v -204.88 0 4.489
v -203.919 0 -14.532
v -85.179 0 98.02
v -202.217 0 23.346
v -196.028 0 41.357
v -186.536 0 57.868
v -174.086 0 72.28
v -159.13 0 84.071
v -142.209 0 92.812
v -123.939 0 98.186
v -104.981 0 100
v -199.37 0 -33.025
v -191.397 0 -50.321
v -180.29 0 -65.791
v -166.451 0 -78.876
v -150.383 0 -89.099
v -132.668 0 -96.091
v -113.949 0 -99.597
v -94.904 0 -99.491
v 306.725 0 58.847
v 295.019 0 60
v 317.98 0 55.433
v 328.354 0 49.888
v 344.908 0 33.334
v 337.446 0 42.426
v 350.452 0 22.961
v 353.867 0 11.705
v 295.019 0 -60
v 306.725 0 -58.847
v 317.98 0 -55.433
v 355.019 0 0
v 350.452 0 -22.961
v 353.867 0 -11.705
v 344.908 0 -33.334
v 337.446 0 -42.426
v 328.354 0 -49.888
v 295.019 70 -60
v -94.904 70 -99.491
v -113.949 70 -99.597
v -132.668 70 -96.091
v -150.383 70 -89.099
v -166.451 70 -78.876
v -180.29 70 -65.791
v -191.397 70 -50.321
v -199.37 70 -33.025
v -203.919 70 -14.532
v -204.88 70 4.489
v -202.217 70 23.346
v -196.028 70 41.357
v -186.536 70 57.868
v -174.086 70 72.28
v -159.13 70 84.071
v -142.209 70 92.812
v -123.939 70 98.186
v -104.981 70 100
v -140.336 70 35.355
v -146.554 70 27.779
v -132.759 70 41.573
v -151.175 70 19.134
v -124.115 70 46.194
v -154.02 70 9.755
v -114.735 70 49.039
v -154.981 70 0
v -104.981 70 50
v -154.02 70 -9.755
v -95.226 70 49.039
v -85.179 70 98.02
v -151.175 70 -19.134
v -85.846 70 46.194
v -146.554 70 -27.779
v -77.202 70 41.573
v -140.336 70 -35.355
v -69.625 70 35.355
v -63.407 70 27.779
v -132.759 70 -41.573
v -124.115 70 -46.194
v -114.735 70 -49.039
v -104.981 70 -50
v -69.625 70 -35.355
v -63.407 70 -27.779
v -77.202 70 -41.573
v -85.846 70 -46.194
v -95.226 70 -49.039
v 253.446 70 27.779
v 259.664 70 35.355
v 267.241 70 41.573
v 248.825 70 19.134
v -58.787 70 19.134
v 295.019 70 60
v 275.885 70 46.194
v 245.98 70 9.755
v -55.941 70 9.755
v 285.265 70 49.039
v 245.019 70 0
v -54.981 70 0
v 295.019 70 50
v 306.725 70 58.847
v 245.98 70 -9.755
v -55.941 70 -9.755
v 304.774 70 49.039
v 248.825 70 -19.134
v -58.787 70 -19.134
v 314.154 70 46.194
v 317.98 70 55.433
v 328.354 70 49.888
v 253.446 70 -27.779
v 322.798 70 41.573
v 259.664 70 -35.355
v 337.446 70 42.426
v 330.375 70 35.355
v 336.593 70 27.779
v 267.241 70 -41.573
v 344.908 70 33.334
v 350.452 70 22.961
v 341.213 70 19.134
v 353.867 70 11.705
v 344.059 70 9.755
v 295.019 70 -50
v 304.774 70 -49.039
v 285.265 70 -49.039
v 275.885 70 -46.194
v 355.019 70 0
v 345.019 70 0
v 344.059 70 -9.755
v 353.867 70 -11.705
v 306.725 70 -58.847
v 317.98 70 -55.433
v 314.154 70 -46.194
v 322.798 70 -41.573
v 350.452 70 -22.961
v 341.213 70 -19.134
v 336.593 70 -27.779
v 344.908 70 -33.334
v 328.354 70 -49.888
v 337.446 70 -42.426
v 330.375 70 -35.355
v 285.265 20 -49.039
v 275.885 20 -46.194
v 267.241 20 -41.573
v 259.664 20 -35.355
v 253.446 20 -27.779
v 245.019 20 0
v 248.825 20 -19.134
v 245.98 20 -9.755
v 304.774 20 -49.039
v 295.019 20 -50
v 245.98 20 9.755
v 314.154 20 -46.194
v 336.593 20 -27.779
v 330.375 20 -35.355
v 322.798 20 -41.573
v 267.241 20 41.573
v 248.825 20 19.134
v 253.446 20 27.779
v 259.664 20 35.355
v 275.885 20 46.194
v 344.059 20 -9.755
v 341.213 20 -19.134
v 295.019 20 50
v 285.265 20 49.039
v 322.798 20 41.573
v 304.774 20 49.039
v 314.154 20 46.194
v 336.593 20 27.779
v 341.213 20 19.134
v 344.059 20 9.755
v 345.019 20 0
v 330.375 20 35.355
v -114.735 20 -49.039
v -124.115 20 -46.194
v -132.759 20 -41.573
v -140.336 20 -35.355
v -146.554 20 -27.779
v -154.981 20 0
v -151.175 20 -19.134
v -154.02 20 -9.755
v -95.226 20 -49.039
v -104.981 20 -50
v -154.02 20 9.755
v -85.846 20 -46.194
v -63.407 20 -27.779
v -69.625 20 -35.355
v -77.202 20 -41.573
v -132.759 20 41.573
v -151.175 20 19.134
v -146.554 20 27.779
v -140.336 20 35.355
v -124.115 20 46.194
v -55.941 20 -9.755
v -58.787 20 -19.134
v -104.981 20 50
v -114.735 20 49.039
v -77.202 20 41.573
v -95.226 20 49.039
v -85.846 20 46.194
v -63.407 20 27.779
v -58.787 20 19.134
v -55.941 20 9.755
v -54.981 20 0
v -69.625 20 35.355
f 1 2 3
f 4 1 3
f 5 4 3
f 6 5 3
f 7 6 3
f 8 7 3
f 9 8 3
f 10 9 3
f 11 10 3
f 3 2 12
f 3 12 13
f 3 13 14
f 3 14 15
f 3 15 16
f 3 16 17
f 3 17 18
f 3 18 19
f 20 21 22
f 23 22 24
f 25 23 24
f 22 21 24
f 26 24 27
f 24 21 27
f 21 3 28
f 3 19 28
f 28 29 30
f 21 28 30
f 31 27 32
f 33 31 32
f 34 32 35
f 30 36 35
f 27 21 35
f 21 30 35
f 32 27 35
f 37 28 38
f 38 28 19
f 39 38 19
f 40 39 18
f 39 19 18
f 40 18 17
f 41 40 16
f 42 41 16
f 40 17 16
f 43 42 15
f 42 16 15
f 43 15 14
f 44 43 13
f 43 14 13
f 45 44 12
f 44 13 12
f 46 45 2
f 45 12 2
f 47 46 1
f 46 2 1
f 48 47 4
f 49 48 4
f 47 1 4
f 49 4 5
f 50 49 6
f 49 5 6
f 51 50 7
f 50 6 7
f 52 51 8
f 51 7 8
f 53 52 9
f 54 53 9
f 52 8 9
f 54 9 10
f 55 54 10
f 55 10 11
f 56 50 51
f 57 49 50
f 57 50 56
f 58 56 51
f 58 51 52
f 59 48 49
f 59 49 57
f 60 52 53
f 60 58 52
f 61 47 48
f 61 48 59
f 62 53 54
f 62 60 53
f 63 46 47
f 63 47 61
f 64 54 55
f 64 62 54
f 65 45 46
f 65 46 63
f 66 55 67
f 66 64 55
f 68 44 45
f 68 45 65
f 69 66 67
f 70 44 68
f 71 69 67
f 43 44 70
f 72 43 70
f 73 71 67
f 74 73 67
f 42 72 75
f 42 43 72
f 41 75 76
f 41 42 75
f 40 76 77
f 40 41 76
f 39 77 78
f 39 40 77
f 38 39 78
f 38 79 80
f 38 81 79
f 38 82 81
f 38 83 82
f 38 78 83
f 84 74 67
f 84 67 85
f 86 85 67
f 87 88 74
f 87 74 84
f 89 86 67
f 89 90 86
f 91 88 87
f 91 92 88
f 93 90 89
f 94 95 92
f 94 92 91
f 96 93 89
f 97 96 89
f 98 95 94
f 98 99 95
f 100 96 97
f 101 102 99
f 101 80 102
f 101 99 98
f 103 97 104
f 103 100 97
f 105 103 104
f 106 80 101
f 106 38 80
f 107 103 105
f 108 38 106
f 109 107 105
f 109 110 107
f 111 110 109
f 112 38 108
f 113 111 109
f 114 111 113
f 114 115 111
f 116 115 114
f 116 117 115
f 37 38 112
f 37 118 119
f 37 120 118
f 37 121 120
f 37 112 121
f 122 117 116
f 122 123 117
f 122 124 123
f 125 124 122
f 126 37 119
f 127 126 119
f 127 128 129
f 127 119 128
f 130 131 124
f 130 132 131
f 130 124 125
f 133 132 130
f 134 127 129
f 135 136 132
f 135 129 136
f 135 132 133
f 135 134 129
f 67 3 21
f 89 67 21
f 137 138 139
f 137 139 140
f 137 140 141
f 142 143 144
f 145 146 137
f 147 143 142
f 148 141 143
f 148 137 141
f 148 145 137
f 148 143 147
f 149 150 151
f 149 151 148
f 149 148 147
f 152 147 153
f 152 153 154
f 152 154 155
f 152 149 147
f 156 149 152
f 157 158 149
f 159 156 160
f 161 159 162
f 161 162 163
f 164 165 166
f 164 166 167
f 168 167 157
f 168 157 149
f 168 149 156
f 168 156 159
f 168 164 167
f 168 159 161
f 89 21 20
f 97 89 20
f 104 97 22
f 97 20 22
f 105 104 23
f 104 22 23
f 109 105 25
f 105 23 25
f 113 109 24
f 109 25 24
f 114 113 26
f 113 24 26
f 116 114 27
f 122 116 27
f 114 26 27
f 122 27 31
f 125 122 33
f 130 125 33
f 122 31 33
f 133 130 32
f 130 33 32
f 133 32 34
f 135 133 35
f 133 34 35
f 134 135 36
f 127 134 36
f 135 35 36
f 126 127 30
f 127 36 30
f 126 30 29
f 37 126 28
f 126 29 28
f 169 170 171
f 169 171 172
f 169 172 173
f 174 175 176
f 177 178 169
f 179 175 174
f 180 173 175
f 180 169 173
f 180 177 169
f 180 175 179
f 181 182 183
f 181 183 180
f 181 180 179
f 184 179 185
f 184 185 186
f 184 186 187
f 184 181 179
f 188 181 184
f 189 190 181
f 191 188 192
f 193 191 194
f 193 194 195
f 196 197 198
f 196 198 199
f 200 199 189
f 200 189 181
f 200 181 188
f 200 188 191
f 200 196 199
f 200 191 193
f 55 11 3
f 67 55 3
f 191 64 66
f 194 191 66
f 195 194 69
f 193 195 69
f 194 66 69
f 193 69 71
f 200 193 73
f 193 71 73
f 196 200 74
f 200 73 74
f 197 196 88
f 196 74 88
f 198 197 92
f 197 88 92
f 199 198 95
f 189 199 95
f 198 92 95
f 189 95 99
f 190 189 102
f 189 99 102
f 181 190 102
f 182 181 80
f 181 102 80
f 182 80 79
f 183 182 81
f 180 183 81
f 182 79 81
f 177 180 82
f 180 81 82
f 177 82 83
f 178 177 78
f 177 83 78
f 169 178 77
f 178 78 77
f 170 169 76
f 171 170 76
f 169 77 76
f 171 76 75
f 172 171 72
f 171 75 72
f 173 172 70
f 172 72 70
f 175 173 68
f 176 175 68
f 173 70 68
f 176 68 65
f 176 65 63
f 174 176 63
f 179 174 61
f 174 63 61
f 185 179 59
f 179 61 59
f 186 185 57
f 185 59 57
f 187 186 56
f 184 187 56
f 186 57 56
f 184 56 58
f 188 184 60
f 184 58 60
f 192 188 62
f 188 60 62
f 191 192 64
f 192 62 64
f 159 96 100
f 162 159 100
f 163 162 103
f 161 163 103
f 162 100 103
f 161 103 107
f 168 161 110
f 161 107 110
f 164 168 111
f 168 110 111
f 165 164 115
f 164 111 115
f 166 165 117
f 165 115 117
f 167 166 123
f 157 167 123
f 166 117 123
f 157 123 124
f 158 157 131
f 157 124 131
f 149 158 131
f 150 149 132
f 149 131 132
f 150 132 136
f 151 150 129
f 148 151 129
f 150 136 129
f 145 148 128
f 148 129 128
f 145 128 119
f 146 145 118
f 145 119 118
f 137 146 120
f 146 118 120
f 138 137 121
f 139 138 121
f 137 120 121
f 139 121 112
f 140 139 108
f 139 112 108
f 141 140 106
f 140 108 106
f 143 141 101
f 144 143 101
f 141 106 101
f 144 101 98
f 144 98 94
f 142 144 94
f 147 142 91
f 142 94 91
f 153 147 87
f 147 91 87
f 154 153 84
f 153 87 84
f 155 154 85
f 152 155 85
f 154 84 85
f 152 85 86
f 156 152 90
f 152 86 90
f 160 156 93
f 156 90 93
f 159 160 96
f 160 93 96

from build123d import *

# Parameters (mm, degrees)
BOSS_EXTRUDE1_DEPTH = 70
SKETCH3_R           = 50
CUT_EXTRUDE1_DEPTH  = 50


with BuildPart() as part:
    # Sketch2 → Boss-Extrude1 (new body)
    with BuildSketch(Plane(origin=(0, 0, 0), x_dir=(1, 0, 0), z_dir=(0, 1, 0))):
        with BuildLine():
            Line((295.019395576, 60), (-94.904260616, 99.491041282))
            ThreePointArc((-94.904260616, 99.491041282), (-204.853283691, 5.044594719), (-104.980604424, -100))
            Line((-104.980604424, -100), (-85.178624226, -98.01980198))
            Line((-85.178624226, -98.01980198), (295.019395576, -60))
            ThreePointArc((295.019395576, -60), (355.019395576, 0), (295.019395576, 60))
        make_face()
    extrude(amount=BOSS_EXTRUDE1_DEPTH)

    # Sketch3 → Cut-Extrude1 (cut)
    with BuildSketch(Plane(origin=(0, 70, 0), x_dir=(1, 0, 0), z_dir=(0, 1, 0))):
        with Locations(Location((-104.980604424, 0, 0), (0, 0, 270))):
            Circle(SKETCH3_R)
        with Locations(Location((295.019395576, 0, 0), (0, 0, 270))):
            Circle(SKETCH3_R)
    extrude(amount=-CUT_EXTRUDE1_DEPTH, mode=Mode.SUBTRACT)


solid = part.part
